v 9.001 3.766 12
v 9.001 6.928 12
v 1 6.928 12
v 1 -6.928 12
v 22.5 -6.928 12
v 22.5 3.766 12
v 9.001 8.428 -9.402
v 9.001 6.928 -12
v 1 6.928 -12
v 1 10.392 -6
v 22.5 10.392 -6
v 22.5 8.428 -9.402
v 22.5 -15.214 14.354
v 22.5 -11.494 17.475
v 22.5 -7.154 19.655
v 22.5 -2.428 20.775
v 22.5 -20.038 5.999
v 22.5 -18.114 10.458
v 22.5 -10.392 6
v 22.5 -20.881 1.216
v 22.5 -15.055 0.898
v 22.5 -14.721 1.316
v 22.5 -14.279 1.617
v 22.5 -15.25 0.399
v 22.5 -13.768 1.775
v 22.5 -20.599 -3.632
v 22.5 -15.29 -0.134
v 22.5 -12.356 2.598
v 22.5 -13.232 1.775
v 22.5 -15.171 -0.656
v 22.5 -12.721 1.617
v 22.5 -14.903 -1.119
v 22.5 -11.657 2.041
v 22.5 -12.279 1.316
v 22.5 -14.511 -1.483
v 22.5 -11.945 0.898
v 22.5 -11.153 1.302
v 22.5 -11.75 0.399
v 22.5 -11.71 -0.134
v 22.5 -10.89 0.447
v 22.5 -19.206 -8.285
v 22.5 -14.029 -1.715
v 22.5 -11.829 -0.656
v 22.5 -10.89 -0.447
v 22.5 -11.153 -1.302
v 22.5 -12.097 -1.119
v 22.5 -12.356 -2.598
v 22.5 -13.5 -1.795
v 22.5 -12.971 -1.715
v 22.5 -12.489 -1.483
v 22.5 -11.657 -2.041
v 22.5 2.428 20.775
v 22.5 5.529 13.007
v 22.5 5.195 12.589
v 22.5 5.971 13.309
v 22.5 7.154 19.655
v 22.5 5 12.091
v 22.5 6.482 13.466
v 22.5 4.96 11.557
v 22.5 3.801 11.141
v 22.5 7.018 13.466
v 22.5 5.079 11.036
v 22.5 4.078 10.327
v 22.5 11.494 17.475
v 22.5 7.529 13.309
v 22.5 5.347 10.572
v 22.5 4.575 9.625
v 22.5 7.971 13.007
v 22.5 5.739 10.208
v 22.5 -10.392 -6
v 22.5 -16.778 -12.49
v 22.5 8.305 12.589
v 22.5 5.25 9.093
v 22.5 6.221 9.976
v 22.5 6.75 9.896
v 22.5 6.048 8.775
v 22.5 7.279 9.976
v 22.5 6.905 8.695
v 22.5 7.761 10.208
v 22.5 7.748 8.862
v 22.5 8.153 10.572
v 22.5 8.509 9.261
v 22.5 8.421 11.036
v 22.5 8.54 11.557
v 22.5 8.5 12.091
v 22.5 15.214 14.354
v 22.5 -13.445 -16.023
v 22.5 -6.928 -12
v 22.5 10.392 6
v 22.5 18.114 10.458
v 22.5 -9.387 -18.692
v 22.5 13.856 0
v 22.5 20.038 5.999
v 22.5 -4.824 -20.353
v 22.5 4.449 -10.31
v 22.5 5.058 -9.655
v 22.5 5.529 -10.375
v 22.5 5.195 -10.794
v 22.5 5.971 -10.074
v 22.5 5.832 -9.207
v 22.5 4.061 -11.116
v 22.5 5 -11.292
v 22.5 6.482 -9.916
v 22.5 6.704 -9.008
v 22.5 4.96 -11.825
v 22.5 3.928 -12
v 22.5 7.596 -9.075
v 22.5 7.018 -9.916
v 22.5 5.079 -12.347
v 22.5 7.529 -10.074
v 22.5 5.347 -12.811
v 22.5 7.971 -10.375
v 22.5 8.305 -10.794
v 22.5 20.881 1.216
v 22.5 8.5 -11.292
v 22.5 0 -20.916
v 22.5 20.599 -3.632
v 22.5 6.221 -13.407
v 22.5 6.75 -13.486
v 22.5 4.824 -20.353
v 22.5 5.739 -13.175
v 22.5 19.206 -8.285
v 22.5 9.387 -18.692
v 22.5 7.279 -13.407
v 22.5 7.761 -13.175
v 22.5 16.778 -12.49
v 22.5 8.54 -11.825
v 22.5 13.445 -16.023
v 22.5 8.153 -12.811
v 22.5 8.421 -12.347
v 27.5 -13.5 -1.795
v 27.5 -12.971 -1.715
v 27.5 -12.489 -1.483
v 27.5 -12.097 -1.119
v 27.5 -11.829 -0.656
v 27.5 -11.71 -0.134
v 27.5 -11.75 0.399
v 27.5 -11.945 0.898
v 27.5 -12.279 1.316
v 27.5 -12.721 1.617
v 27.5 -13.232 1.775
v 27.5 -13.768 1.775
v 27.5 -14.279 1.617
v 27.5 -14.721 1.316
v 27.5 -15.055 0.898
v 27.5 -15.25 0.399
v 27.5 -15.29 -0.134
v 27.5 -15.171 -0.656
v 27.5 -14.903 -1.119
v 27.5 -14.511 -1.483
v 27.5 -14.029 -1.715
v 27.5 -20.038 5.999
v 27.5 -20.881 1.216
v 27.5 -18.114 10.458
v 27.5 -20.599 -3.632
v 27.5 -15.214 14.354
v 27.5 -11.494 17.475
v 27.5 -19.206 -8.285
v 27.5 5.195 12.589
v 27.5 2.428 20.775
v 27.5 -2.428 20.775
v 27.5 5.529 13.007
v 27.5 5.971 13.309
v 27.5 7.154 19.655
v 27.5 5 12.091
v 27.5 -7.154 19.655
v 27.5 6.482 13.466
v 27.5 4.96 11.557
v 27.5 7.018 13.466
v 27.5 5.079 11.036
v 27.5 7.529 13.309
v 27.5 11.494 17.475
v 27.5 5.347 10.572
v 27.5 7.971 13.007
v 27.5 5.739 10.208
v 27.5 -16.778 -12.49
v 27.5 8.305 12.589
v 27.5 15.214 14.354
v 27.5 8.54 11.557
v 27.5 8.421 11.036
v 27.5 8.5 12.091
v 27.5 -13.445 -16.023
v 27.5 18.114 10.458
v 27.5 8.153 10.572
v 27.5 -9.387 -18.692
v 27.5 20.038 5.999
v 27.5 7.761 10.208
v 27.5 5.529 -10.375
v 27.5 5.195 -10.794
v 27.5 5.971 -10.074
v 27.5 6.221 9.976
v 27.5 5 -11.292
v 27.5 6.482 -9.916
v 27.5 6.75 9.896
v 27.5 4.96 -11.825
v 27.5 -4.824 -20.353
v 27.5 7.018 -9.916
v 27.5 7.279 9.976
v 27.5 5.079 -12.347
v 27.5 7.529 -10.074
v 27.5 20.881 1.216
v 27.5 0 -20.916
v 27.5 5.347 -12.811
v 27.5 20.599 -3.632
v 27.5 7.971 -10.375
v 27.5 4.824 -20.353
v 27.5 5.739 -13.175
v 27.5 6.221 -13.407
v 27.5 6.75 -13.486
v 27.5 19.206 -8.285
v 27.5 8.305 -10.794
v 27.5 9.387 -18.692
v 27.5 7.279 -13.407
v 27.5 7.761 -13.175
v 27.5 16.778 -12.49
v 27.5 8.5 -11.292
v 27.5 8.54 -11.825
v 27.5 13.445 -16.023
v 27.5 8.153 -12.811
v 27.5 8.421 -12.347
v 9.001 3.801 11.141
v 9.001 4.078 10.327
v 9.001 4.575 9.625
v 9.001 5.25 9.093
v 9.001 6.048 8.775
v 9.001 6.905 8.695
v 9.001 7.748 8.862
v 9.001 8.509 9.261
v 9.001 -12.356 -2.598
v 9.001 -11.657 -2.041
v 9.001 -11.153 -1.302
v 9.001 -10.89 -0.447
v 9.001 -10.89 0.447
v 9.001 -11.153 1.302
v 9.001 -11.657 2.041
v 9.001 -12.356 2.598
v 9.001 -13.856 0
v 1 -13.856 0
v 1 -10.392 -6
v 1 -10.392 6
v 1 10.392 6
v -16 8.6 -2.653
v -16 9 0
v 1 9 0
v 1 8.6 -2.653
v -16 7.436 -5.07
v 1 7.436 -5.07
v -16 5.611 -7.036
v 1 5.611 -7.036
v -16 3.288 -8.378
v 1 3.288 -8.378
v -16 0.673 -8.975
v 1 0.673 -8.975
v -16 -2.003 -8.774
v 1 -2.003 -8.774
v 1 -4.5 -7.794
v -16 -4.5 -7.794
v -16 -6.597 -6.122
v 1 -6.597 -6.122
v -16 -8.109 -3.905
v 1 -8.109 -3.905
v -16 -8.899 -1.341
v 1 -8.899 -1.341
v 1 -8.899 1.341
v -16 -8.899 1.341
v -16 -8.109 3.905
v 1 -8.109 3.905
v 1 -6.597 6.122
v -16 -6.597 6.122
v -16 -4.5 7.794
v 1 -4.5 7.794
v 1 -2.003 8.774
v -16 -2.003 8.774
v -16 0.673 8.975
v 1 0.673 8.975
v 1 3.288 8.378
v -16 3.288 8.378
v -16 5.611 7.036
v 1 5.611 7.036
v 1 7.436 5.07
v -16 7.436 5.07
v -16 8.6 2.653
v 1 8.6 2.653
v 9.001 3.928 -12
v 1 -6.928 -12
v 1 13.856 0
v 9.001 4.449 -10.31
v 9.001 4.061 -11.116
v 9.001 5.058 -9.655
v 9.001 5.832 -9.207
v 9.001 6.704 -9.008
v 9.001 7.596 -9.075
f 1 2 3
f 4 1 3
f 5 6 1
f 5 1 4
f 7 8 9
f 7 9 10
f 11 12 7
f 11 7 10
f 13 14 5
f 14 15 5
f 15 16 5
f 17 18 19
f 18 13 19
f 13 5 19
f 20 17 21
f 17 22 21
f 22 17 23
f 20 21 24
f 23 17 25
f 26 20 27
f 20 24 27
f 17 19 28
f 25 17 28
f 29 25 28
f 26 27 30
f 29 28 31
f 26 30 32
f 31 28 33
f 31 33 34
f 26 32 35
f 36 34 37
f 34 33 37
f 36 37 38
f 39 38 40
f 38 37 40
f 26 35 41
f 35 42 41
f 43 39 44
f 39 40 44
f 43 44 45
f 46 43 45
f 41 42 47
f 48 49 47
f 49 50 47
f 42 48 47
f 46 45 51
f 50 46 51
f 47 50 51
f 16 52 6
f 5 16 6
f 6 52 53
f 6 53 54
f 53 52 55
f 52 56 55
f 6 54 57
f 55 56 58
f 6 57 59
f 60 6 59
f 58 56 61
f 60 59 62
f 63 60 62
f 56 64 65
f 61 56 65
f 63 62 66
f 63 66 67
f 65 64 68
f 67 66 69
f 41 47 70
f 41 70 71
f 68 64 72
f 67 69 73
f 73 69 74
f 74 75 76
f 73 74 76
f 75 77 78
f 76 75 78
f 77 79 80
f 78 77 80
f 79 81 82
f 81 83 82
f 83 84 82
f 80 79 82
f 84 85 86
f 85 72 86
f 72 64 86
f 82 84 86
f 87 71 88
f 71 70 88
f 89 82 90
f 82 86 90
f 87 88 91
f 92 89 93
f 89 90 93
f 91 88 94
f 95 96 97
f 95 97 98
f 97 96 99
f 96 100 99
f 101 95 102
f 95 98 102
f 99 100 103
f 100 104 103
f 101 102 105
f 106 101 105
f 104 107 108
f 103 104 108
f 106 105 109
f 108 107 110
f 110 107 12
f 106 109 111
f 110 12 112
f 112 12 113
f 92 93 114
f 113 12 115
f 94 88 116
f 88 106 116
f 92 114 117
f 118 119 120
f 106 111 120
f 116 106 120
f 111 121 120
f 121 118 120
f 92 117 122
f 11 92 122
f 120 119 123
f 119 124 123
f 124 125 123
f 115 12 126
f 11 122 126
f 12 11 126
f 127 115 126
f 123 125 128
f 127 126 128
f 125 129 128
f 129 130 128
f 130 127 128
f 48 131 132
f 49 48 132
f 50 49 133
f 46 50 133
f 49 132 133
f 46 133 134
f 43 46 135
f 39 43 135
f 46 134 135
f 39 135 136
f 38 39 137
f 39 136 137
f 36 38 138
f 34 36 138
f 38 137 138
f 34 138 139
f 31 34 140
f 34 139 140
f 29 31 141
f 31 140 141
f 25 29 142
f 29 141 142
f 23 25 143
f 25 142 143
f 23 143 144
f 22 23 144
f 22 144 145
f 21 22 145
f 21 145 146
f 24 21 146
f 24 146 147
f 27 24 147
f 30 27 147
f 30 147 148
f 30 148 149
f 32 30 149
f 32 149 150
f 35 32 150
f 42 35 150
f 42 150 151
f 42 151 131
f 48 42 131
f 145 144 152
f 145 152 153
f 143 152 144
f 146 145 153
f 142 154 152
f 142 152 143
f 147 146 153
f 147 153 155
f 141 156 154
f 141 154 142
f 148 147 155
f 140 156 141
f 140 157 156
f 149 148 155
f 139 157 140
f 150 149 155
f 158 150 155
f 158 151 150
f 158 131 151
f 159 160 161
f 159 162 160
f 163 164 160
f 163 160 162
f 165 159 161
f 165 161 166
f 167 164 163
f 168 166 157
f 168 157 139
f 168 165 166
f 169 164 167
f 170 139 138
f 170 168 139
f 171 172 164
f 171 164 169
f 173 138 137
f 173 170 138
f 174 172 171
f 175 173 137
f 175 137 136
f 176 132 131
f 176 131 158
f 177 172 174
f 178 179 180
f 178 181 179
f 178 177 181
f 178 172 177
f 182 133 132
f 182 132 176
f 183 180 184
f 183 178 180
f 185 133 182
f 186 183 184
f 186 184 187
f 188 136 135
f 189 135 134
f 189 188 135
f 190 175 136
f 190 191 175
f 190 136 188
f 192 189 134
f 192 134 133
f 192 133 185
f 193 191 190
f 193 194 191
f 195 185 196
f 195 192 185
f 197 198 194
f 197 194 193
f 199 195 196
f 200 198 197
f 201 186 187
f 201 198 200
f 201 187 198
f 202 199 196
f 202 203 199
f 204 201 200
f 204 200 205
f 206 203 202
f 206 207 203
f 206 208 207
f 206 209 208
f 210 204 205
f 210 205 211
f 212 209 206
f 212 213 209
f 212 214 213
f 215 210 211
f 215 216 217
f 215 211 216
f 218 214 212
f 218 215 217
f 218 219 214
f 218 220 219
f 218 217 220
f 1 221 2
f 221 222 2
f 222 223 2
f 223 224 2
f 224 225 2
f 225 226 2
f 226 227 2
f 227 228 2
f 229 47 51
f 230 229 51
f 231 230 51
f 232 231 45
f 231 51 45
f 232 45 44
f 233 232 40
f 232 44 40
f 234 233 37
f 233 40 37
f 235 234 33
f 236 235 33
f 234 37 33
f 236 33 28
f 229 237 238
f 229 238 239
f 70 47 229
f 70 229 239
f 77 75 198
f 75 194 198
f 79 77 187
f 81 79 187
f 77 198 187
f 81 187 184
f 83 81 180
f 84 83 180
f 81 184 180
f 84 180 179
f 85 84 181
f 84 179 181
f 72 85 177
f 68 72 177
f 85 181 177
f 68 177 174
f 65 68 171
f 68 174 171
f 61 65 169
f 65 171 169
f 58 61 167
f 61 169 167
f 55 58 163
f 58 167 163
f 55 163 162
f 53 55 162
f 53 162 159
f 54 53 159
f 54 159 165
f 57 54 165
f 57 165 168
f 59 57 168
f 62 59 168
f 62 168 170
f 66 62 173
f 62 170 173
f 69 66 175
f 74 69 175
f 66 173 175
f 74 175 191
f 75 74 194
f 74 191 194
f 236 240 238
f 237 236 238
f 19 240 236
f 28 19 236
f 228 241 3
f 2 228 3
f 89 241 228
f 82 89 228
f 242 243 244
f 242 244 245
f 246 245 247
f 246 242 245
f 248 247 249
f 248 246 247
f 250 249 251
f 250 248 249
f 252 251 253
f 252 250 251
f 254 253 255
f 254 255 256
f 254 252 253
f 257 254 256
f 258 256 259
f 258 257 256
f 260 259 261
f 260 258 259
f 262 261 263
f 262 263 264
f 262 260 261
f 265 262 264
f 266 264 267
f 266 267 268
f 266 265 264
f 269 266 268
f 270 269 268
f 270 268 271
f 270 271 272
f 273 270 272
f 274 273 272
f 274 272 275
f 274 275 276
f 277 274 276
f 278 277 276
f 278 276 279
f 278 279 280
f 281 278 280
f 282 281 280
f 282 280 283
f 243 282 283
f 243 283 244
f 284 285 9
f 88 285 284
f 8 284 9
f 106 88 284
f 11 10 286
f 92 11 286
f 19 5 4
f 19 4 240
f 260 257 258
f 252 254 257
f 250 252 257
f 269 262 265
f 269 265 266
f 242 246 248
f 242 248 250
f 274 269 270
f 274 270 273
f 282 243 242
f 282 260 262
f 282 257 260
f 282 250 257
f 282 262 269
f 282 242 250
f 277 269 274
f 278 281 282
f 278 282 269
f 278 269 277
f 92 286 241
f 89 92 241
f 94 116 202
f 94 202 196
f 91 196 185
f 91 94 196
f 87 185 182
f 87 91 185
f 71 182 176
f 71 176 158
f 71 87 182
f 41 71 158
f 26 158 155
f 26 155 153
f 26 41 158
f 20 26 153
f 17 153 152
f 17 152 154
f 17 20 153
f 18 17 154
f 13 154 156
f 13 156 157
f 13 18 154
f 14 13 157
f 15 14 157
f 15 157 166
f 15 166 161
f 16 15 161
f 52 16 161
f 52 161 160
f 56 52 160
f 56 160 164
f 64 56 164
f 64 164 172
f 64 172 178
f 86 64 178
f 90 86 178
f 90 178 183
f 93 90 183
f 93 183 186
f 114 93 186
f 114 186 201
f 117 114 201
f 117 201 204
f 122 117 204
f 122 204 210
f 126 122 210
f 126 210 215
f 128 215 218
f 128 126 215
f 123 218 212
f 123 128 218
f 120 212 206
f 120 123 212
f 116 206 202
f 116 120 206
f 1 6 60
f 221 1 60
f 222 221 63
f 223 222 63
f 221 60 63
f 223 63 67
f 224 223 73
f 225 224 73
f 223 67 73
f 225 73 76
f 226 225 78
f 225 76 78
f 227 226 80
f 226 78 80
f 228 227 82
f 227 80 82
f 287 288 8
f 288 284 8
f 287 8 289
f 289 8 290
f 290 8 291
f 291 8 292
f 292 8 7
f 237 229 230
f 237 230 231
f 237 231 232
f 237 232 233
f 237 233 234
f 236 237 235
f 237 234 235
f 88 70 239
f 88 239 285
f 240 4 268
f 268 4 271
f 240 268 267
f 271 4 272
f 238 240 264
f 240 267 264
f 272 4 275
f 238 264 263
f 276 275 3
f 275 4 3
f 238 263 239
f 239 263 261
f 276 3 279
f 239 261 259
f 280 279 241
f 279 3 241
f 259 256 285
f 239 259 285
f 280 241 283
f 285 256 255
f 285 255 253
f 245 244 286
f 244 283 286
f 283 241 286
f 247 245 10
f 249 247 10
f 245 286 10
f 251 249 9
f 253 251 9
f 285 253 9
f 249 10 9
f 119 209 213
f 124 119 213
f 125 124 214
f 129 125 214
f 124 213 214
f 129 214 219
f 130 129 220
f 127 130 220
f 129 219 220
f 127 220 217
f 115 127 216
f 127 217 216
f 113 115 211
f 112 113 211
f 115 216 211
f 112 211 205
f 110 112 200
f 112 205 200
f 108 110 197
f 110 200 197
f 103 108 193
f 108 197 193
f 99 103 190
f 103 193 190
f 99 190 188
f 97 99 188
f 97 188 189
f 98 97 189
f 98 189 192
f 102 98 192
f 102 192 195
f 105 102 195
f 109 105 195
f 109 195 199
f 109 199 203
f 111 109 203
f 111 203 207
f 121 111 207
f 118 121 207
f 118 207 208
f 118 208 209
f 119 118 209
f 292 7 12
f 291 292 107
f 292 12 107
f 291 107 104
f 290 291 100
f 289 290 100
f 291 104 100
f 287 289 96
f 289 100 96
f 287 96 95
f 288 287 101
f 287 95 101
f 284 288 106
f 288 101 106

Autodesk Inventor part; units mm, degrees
ref_plane "YZ Plane" through (0, 0, 0) normal (1, 0, 0) x (0, 1, 0)
ref_plane "XZ Plane" through (0, 0, 0) normal (0, 1, 0) x (-1, 0, 0)
ref_plane "XY Plane" through (0, 0, 0) normal (0, 0, 1) x (1, 0, 0)
sketch "Sketch1" plane through (0, 0, 0) normal (0, 0, 1) x (1, 0, 0)
  line L0 (0, 0) -> (-13, 0)
  line L1 (-13, 0) -> (-13, 9)
  line L2 (-13, 9) -> (0, 9)
  line L3 (0, 9) -> (0, 12)
  line L4 (0, 12) -> (8, 12)
  line L5 (8, 12) -> (8, 11)
  line L6 (33, 0) -> (0, 0)
  line L7 (8, 11) -> (8, 0)
  dimension "d0" = 13
  dimension "d1" = 9
  dimension "d2" = 13
  dimension "d3" = 3
  dimension "d4" = 8
  dimension "d5" = 1
sketch "Sketch1 outline for Revolution1" plane through (0, 0, 0) normal (0, 0, 1) x (1, 0, 0)
  line L0 (8, 11) -> (8, 12)
  line L1 (8, 0) -> (8, 11)
  line L2 (0, 0) -> (8, 0)
  line L3 (-13, 0) -> (0, 0)
  line L4 (-13, 9) -> (-13, 0)
  line L5 (0, 9) -> (-13, 9)
  line L6 (0, 12) -> (0, 9)
  line L7 (8, 12) -> (0, 12)
revolve "Revolution1" add sketch "Sketch1 outline for Revolution1" angle 360 about axis through (33, 0, 0) along (-1, 0, 0)
sketch "Sketch2" plane through (8, 0, 0) normal (1, 0, 0) x (0, 0, -1)
  circle A0 centre (0, 0) radius 12
  line L0 (12, -6.928203) -> (0, -13.856406)
  line L1 (0, -13.856406) -> (-12, -6.928203)
  line L2 (-12, -6.928203) -> (-12, 6.928203)
  line L3 (-12, 6.928203) -> (0, 13.856406)
  line L4 (0, 13.856406) -> (12, 6.928203)
  line L5 (12, 6.928203) -> (12, -6.928203)
  circle A1 centre (0, 0) radius 11
  point P0 (0, 0)
  point P1 (12, 0)
  point P2 (6, 10.392305)
  point P3 (6, -10.392305)
  point P4 (-6, 10.392305)
  point P5 (-12, 0)
  point P6 (-6, -10.392305)
  dimension "d12" = 24
  dimension "d13" = 0
sketch "Sketch2 outline for Extrusion1" plane through (8, 0, 0) normal (1, 0, 0) x (0, 0, -1)
  line L0 (12, 0) -> (12, 6.928203)
  arc A0 (6, 10.392305) -> (12, 0) centre (0, 0) cw
  line L1 (12, 6.928203) -> (6, 10.392305)
  line L2 (12, -6.928203) -> (12, 0)
  line L3 (6, -10.392305) -> (12, -6.928203)
  arc A1 (12, 0) -> (6, -10.392305) centre (0, 0) cw
  line L4 (6, 10.392305) -> (0, 13.856406)
  arc A2 (-6, 10.392305) -> (6, 10.392305) centre (0, 0) cw
  line L5 (0, 13.856406) -> (-6, 10.392305)
  line L6 (-6, 10.392305) -> (-12, 6.928203)
  arc A3 (-12, 0) -> (-6, 10.392305) centre (0, 0) cw
  line L7 (-12, 6.928203) -> (-12, 0)
  line L8 (-12, 0) -> (-12, -6.928203)
  arc A4 (-6, -10.392305) -> (-12, 0) centre (0, 0) cw
  line L9 (-12, -6.928203) -> (-6, -10.392305)
  line L10 (-6, -10.392305) -> (0, -13.856406)
  arc A5 (6, -10.392305) -> (-6, -10.392305) centre (0, 0) cw
  line L11 (0, -13.856406) -> (6, -10.392305)
extrude "Extrusion1" add sketch "Sketch2 outline for Extrusion1" against normal blind 8 contours A0 L1 L0 | L2 L3 A1 | A2 L5 L4 | L11 L10 A5 | A3 L7 L6 | L9 L8 A4
sketch "Sketch3" plane through (-13, 0, 0) normal (-1, 0, 0) x (0, 0, 1)
  circle A0 centre (0, 0) radius 7.75 projected
  circle A1 centre (0, 0) radius 6.5
  point P0 (0, 0)
  dimension "d18" = 13
sketch "Sketch3 outline for Extrusion2" plane through (-13, 0, 0) normal (-1, 0, 0) x (0, 0, 1)
  circle A0 centre (0, 0) radius 6.5
extrude "Extrusion2" cut sketch "Sketch3 outline for Extrusion2" against normal blind 13
sketch "Sketch4" plane through (0, 0, 0) normal (-1, 0, 0) x (0, 0, 1)
  circle A0 centre (0, 0) radius 1.55
  point P0 (0, 0)
  dimension "d21" = 3.1
sketch "Sketch4 outline for Extrusion3" plane through (0, 0, 0) normal (-1, 0, 0) x (0, 0, 1)
  circle A0 centre (0, 0) radius 1.55
extrude "Extrusion3" cut sketch "Sketch4 outline for Extrusion3" against normal through all
ref_plane "작업 평면2" through (20.5, 0, -6) normal (0, 0, 1) x (1, 0, 0)
sketch "스케치7" plane through (20.5, 0, -6) normal (0, 0, 1) x (1, 0, 0)
  circle A0 centre (6.75, 0) radius 1.3
  line L0 (6.75, -3.175426) -> (4, -1.587713)
  line L1 (4, -1.587713) -> (4, 1.587713)
  line L2 (4, 1.587713) -> (6.75, 3.175426)
  line L3 (6.75, 3.175426) -> (9.5, 1.587713)
  line L4 (9.5, 1.587713) -> (9.5, -1.587713)
  line L5 (9.5, -1.587713) -> (6.75, -3.175426)
  line L6 (12.5, 6) -> (12.5, -6)
  point P0 (-20.5, 0)
  point P1 (9.5, 0)
  dimension "d27" = 2.6
  dimension "d28" = 5.5
  dimension "d37" = 3
extrude "돌출6" [suppressed]
extrude "돌출7" [suppressed]
sketch "스케치8" plane through (33, 0, 0) normal (1, 0, 0) x (0, 0, -1)
  point P0 (0, 0)
sketch "스케치9" plane through (8, -6.928203, 12) normal (1, 0, 0) x (0, 0, -1)
  circle A0 centre (12, 6.928203) radius 16
  dimension "d38" = 32
extrude "돌출8" [suppressed]
move faces "이동1" translate (12.5, 0, 10) faces at (8, 7.353412, -4.2935)
sketch "스케치10" plane through (20.5, -6.928203, 12) normal (1, 0, 0) x (0, 0, -1)
  circle A0 centre (12, 6.928203) radius 1.55
  circle A1 centre (12, 6.928203) radius 25
  dimension "d44" = 50
extrude "돌출9" [suppressed]
sketch "스케치11" plane through (20.5, 0, 0) normal (-1, 0, 0) x (0, 0, 1)
  circle A0 centre (0, 0) radius 1.55 projected
  circle A1 centre (0, 0) radius 15
  circle A2 centre (0, 0) radius 16
  point P0 (0, 0)
  dimension "d49" = 30
  dimension "d50" = 32
extrude "돌출10" [suppressed]
sketch "스케치12" plane through (20.5, -6.928203, 12) normal (1, 0, 0) x (0, 0, -1)
  circle A0 centre (12, 6.928203) radius 20.916385
sketch "스케치12 outline for 돌출11" plane through (20.5, -6.928203, 12) normal (1, 0, 0) x (0, 0, -1)
  circle A0 centre (12, 6.928203) radius 20.916385
extrude "돌출11" add sketch "스케치12 outline for 돌출11" along normal blind 10
sketch "스케치14" plane through (30.5, 0, 0) normal (1, 0, 0) x (0, 0, -1)
  circle A0 centre (0, 0) radius 13.5
  circle A1 centre (0, -13.5) radius 1.795072
  circle A2 centre (11.691343, 6.75) radius 1.795072
  circle A3 centre (-11.691343, 6.75) radius 1.795072
  dimension "d59" = 27
  dimension "d64" = 360
sketch "스케치14 outline for 돌출13" plane through (30.5, 0, 0) normal (1, 0, 0) x (0, 0, -1)
  circle A0 centre (0, -13.5) radius 1.795072
  circle A1 centre (11.691343, 6.75) radius 1.795072
  circle A2 centre (-11.691343, 6.75) radius 1.795072
extrude "돌출13" cut sketch "스케치14 outline for 돌출13" against normal blind 15
sketch "스케치15" plane through (30.5, 0, 0) normal (1, 0, 0) x (0, 0, -1)
  point P0 (0, 0)
sketch "스케치16" plane through (20.5, 0, 0) normal (-1, 0, 0) x (0, 0, 1)
  circle A0 centre (0, -13.856406) radius 3
  circle A1 centre (11.691343, 6.75) radius 1.795072
  circle A2 centre (11.691343, 6.75) radius 3
  circle A3 centre (-12, 6.928203) radius 3
  point P0 (0, 0)
  dimension "d66" = 6
  dimension "d67" = 6
  dimension "d68" = 6
sketch "스케치16 outline for 돌출14" plane through (20.5, 0, 0) normal (-1, 0, 0) x (0, 0, 1)
  circle A0 centre (11.691343, 6.75) radius 3
  circle A1 centre (-12, 6.928203) radius 3
  circle A2 centre (0, -13.856406) radius 3
extrude "돌출14" cut sketch "스케치16 outline for 돌출14" along normal blind 11.499
move faces "이동2" translate (-3, 0, 0) faces at (30.5, 0.037854, 0.072124)
move faces "이동3" translate (9, 0, 0) faces at (0, 0.36161, -10.978127)
move faces "이동4" translate (5, 0, 0) faces at (-13, 8.063695, 0.97911)
move faces "이동5" translate (-8, 0, 0) faces at (9, -0.36161, -10.978127)
move faces "이동6" translate (-25.75, 0, 0) faces at (13.666667, -0.124723, 1.544974)
move faces "이동7" translate (-8, 0, 0) faces at (-8, 8.063695, 0.97911)
move faces "이동8" translate (-36.5, 0, 0) faces at (20.5, -0.007186, -0.457486)
move faces "이동9" translate (-16, 0, 0) faces at (0, -0.518517, 4.787041)
move faces "이동10" translate (2, 0, 0) faces at (20.5, -1, -14.972128)
properties part number "HEX HUB_Version2 (cheeta)"
